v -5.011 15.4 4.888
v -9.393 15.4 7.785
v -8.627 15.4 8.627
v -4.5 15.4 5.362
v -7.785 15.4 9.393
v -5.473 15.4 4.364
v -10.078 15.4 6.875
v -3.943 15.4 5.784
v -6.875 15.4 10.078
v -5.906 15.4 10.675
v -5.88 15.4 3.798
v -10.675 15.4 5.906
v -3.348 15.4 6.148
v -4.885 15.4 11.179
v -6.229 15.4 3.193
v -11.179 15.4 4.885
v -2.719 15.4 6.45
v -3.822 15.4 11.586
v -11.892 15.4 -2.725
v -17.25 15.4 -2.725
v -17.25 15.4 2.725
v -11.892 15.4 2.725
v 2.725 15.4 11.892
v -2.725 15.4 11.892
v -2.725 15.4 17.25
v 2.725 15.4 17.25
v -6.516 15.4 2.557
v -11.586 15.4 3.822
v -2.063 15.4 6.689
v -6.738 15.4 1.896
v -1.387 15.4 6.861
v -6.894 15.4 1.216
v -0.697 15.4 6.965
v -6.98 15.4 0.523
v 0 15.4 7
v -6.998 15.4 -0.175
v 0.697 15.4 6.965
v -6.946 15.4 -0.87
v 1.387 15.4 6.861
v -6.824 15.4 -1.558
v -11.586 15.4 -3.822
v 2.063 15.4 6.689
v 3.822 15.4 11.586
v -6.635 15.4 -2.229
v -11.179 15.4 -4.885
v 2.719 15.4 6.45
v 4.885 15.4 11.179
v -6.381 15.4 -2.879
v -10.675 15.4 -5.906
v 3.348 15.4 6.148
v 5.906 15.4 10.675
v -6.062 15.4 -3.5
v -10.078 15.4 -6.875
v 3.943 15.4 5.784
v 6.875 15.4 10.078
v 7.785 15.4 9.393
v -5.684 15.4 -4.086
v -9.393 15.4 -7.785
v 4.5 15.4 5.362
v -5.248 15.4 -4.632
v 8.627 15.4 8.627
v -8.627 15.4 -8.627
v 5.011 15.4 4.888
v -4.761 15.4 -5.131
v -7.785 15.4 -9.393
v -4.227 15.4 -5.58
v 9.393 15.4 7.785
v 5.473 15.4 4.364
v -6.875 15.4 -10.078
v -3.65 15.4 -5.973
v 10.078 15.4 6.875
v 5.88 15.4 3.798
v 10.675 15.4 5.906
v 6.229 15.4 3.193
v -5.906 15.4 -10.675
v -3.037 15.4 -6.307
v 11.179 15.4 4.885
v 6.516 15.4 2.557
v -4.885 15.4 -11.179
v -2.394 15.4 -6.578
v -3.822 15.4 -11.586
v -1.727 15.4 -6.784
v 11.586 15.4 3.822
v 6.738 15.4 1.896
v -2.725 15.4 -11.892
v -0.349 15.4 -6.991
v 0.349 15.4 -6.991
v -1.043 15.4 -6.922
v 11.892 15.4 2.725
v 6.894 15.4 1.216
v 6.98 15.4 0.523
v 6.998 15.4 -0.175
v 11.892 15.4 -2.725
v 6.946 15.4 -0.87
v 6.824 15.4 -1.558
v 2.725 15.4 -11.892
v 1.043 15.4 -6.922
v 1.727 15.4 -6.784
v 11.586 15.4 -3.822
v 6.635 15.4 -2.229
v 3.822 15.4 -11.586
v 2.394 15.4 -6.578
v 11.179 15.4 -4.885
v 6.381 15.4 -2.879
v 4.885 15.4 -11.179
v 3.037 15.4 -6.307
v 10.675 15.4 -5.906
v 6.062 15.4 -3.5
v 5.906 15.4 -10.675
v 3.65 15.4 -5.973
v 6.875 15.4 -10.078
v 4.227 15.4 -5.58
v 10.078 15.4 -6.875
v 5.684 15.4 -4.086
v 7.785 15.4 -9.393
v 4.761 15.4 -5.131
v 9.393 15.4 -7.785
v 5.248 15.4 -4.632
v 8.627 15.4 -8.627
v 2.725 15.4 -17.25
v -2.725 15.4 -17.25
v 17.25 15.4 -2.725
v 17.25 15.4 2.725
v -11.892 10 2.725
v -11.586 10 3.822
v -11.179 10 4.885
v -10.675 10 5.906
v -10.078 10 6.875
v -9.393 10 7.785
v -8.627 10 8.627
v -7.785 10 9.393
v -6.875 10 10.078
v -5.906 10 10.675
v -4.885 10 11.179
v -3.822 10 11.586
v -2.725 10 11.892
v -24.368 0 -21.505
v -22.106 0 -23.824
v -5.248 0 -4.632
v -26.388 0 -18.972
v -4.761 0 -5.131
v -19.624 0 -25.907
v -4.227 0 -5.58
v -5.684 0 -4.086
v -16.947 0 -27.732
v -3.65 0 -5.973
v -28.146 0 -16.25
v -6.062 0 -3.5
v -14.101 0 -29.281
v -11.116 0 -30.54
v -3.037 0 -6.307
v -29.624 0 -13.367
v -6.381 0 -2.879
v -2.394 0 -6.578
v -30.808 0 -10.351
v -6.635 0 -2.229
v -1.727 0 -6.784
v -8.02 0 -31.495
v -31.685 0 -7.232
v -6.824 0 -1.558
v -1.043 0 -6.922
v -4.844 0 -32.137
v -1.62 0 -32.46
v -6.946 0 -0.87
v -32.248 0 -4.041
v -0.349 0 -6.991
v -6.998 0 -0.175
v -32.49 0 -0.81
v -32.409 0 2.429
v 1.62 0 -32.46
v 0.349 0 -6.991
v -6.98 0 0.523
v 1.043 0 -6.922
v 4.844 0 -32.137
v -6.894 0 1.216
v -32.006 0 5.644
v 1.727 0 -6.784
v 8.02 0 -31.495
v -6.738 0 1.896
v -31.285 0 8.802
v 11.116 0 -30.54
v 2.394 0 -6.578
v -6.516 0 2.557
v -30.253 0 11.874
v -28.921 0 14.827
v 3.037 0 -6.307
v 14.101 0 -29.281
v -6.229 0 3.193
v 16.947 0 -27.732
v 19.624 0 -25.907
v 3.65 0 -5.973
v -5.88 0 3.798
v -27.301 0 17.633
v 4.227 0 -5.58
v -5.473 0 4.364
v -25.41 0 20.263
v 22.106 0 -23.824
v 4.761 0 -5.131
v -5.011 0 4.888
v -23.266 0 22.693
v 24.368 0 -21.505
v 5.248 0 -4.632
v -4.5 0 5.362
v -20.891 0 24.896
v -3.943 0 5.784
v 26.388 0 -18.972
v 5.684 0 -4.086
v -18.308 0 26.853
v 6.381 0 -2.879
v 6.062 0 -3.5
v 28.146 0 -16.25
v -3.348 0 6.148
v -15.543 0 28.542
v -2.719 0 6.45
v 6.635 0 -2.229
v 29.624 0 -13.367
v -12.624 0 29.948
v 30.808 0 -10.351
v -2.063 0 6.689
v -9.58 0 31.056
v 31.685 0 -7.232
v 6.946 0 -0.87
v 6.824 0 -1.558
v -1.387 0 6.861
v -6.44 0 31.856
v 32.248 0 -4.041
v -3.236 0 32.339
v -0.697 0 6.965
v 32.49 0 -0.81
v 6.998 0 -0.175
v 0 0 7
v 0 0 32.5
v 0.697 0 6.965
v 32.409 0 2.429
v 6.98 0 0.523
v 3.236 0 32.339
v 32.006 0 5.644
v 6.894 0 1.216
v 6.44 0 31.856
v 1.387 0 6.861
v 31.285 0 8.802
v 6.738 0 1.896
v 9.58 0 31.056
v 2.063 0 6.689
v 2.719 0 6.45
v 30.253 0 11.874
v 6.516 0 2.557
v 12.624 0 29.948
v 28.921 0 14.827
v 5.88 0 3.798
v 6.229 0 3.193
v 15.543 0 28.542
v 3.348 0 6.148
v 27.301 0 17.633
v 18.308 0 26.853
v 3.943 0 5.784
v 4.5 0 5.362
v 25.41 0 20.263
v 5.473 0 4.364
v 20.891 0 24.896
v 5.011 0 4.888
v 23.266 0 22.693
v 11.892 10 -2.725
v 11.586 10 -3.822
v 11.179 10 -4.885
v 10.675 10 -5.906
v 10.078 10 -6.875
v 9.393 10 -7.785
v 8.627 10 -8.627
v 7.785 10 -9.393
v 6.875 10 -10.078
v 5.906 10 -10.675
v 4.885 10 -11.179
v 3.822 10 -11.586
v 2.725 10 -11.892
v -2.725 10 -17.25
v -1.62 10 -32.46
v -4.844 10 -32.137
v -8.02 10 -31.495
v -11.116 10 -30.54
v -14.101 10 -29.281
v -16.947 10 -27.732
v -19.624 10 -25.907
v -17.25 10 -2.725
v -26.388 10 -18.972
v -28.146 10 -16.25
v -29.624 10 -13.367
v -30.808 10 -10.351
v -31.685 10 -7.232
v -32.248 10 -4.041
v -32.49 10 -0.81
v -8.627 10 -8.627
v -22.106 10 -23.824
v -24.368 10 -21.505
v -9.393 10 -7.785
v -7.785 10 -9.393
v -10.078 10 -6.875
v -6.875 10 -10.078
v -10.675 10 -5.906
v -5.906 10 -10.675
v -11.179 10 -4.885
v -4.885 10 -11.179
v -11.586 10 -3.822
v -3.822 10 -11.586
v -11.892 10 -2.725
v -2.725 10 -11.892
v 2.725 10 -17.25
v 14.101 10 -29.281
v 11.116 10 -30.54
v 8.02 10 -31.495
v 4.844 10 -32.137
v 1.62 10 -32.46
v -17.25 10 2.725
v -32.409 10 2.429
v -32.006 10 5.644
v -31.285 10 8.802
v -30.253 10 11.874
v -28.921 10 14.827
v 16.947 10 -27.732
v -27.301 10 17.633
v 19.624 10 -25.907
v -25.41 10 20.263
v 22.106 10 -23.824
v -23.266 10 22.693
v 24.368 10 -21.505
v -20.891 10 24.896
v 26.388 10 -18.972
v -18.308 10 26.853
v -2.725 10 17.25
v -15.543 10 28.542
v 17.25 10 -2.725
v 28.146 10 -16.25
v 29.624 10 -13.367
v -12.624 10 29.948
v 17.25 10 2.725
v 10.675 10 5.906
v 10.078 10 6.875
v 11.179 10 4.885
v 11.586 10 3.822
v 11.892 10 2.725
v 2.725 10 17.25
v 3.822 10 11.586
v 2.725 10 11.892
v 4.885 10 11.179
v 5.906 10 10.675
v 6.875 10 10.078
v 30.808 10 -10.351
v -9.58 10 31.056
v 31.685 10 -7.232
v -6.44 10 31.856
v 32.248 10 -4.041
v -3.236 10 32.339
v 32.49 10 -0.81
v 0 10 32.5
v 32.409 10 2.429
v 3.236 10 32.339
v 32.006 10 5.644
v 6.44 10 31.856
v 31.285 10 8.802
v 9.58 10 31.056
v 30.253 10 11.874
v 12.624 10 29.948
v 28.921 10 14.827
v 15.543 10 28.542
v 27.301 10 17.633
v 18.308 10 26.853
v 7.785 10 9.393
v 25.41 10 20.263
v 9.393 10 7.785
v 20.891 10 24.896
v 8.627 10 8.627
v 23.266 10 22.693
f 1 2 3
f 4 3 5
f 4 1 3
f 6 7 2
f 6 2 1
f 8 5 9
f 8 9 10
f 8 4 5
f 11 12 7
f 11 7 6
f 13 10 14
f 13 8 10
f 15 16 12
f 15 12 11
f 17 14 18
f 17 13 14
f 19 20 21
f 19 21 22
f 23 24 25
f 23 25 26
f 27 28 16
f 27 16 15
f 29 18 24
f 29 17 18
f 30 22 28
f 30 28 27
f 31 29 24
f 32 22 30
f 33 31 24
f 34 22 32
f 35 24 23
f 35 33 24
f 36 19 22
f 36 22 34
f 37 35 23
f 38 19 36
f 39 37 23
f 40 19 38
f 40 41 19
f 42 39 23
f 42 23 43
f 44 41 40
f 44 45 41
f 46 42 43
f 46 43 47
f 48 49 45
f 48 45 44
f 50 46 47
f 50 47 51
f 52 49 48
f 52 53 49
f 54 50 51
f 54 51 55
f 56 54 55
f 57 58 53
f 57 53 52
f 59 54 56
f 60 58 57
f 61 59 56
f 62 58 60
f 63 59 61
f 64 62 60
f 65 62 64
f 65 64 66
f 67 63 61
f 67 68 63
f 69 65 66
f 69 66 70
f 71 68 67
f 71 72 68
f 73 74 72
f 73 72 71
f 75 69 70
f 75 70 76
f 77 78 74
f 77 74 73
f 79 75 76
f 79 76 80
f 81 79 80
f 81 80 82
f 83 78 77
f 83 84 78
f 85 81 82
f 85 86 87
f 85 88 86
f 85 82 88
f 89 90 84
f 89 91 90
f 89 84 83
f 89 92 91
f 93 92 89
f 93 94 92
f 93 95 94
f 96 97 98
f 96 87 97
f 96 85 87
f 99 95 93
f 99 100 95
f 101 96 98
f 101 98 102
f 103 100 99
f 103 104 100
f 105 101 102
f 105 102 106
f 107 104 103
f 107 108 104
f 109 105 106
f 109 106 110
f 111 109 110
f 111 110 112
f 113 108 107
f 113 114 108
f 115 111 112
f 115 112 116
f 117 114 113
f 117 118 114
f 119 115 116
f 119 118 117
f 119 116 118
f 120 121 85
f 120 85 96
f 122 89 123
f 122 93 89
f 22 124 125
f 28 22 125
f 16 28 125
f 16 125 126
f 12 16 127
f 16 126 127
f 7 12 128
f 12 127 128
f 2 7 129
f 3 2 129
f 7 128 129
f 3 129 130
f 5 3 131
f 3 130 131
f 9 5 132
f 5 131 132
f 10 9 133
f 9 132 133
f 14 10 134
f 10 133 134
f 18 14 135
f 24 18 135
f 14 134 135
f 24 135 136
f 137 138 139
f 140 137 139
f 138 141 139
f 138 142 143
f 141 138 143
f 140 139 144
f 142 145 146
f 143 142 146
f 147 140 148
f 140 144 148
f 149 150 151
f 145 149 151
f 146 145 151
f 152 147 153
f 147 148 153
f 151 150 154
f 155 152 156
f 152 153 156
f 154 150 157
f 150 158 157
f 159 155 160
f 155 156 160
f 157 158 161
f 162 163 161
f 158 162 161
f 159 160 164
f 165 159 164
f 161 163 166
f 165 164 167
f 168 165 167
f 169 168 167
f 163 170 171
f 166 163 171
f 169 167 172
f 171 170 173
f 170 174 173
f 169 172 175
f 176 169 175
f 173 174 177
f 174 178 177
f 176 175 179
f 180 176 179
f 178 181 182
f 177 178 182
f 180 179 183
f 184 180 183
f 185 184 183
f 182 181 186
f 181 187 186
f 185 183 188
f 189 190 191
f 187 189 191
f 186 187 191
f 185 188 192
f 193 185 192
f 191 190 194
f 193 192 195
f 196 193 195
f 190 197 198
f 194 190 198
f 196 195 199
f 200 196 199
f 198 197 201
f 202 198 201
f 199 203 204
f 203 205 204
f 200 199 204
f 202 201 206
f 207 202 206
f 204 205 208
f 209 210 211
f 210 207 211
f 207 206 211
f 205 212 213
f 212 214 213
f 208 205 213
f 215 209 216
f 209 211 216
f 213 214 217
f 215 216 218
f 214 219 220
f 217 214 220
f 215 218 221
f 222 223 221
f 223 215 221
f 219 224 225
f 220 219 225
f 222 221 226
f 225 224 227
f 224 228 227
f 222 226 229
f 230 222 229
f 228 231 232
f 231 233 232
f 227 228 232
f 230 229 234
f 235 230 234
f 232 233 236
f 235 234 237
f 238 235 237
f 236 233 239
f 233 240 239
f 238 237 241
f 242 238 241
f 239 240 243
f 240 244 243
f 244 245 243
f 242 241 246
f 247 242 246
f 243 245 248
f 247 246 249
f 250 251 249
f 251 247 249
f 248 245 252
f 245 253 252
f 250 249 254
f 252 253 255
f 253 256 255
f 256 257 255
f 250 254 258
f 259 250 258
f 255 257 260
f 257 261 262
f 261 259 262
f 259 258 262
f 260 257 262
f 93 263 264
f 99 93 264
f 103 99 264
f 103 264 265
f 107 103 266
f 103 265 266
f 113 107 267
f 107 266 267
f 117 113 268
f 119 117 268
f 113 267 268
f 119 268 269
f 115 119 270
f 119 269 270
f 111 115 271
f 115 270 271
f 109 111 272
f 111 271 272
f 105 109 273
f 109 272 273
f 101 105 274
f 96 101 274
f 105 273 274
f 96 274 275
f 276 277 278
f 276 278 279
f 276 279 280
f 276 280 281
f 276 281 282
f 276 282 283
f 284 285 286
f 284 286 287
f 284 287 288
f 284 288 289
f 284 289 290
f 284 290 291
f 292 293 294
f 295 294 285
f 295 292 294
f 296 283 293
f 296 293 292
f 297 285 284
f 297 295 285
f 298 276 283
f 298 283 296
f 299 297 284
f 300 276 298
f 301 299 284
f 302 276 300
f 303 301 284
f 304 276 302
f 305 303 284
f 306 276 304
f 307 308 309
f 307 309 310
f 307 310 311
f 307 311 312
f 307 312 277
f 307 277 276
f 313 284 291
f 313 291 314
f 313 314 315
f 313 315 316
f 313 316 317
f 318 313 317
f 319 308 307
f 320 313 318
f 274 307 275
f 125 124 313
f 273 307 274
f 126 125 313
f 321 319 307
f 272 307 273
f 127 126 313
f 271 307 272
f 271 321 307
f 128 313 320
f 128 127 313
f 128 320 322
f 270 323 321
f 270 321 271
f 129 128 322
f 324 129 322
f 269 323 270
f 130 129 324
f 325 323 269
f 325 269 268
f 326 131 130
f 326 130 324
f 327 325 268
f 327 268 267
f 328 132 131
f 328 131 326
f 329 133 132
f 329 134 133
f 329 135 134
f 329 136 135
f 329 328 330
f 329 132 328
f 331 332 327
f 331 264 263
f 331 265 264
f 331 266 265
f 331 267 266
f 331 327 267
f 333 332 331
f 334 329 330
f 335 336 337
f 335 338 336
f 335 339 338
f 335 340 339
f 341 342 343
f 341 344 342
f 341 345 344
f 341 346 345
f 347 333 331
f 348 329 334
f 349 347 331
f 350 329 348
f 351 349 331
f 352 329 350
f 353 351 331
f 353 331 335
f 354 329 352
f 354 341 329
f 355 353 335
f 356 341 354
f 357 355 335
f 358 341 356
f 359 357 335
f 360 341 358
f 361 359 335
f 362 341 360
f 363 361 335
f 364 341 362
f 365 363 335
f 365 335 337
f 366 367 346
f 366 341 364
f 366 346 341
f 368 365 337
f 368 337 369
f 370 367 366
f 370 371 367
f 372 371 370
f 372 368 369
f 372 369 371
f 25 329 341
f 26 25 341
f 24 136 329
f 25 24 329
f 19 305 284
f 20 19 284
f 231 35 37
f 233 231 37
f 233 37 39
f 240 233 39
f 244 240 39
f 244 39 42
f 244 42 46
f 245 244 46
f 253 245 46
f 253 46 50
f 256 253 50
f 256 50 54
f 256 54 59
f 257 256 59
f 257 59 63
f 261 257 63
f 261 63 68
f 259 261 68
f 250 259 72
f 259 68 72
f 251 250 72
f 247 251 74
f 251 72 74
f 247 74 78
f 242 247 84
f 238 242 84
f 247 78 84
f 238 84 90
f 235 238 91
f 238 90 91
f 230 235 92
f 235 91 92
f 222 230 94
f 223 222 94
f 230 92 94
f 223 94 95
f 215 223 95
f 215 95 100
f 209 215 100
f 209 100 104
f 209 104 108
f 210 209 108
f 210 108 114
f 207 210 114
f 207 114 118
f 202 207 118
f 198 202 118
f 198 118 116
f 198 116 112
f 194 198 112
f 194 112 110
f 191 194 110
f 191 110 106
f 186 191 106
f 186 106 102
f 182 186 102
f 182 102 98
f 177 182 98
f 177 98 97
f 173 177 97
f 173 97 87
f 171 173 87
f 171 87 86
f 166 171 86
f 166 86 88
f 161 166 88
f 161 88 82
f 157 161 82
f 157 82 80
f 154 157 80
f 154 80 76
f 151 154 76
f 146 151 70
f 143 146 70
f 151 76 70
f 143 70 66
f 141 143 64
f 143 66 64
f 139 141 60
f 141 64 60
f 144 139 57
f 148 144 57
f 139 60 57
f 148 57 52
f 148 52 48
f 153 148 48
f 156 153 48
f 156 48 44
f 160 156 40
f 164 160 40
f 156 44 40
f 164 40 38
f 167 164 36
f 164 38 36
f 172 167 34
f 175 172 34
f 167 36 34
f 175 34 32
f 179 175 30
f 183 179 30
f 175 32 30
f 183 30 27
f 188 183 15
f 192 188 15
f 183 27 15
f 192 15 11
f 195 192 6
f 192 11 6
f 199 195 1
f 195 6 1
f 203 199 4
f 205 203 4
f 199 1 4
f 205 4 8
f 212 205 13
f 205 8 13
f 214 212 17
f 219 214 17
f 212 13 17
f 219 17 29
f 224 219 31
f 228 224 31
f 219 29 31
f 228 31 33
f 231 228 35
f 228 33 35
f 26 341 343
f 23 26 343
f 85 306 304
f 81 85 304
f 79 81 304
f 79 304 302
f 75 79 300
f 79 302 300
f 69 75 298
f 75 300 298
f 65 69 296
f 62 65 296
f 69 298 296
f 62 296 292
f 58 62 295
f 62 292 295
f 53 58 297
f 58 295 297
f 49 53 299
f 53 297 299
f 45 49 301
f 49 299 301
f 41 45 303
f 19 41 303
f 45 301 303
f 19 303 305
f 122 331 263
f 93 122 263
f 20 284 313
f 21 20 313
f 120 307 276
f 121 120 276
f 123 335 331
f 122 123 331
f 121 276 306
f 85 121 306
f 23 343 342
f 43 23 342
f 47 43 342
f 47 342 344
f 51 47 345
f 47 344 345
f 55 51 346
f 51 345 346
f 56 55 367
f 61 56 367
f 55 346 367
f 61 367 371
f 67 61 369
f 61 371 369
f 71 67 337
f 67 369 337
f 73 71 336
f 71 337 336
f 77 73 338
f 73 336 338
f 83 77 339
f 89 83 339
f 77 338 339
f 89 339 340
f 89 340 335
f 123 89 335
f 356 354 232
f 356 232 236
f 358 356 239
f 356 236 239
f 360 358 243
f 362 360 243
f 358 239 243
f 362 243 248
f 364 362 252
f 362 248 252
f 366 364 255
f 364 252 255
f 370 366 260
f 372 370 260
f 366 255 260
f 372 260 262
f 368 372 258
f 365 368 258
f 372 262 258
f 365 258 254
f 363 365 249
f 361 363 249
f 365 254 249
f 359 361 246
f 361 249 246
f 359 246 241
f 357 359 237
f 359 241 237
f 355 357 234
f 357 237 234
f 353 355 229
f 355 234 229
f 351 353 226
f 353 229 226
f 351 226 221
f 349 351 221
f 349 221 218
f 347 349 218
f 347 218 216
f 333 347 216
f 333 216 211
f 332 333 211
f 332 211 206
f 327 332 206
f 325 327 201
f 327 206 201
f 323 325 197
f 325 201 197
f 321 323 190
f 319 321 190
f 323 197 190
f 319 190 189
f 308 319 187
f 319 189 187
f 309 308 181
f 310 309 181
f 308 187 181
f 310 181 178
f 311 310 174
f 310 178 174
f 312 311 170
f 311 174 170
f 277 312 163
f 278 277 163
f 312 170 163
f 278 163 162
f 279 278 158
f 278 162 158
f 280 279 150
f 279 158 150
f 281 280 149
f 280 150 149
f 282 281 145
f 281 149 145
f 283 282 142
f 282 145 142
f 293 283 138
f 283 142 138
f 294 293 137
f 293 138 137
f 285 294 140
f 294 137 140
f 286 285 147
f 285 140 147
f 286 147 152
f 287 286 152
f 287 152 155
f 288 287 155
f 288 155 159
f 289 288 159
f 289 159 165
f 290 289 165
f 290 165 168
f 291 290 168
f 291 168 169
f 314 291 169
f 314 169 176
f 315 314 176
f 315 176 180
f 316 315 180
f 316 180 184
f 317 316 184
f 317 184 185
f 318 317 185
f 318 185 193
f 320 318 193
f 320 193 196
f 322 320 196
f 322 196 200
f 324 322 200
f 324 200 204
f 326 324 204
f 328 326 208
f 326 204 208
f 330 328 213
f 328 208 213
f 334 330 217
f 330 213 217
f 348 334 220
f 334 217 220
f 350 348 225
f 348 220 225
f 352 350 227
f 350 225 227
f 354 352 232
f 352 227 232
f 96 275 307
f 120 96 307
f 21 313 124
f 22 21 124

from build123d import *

# Parameters (mm, degrees)
SKETCH1_R           = 32.5
BOSS_EXTRUDE1_DEPTH = 10
BOSS_EXTRUDE2_DEPTH = 5.4
SKETCH3_R           = 7
CUT_EXTRUDE1_DEPTH  = 49.473291615


with BuildPart() as part:
    # Sketch1 → Boss-Extrude1 (new body)
    with BuildSketch(Plane(origin=(0, 0, 0), x_dir=(1, 0, 0), z_dir=(0, 1, 0))):
        with Locations(Location((0, 0, 0), (0, 0, 270))):
            Circle(SKETCH1_R)
    extrude(amount=BOSS_EXTRUDE1_DEPTH)

    # Sketch2 → Boss-Extrude2 (add)
    with BuildSketch(Plane(origin=(0, 10, 0), x_dir=(1, 0, 0), z_dir=(0, 1, 0))):
        with BuildLine():
            Line((2.725, 11.891777622), (2.725, 17.25))
            Line((2.725, 17.25), (-2.725, 17.25))
            Line((-2.725, 17.25), (-2.725, 11.891777622))
            ThreePointArc((-2.725, 11.891777622), (-8.62670273, 8.62670273), (-11.891777622, 2.725))
            Line((-11.891777622, 2.725), (-17.25, 2.725))
            Line((-17.25, 2.725), (-17.25, -2.725))
            Line((-17.25, -2.725), (-11.891777622, -2.725))
            ThreePointArc((-11.891777622, -2.725), (-8.62670273, -8.62670273), (-2.725, -11.891777622))
            Line((-2.725, -11.891777622), (-2.725, -17.25))
            Line((-2.725, -17.25), (2.725, -17.25))
            Line((2.725, -17.25), (2.725, -11.891777622))
            ThreePointArc((2.725, -11.891777622), (8.62670273, -8.62670273), (11.891777622, -2.725))
            Line((11.891777622, -2.725), (17.25, -2.725))
            Line((17.25, -2.725), (17.25, 2.725))
            Line((17.25, 2.725), (11.891777622, 2.725))
            ThreePointArc((11.891777622, 2.725), (8.62670273, 8.62670273), (2.725, 11.891777622))
        make_face()
    extrude(amount=BOSS_EXTRUDE2_DEPTH)

    # Sketch3 → Cut-Extrude1 (cut, through all)
    with BuildSketch(Plane(origin=(0, 15.4, 0), x_dir=(1, 0, 0), z_dir=(0, 1, 0))):
        with Locations(Location((0, 0, 0), (0, 0, 270))):
            Circle(SKETCH3_R)
    extrude(amount=-CUT_EXTRUDE1_DEPTH, mode=Mode.SUBTRACT)


solid = part.part
